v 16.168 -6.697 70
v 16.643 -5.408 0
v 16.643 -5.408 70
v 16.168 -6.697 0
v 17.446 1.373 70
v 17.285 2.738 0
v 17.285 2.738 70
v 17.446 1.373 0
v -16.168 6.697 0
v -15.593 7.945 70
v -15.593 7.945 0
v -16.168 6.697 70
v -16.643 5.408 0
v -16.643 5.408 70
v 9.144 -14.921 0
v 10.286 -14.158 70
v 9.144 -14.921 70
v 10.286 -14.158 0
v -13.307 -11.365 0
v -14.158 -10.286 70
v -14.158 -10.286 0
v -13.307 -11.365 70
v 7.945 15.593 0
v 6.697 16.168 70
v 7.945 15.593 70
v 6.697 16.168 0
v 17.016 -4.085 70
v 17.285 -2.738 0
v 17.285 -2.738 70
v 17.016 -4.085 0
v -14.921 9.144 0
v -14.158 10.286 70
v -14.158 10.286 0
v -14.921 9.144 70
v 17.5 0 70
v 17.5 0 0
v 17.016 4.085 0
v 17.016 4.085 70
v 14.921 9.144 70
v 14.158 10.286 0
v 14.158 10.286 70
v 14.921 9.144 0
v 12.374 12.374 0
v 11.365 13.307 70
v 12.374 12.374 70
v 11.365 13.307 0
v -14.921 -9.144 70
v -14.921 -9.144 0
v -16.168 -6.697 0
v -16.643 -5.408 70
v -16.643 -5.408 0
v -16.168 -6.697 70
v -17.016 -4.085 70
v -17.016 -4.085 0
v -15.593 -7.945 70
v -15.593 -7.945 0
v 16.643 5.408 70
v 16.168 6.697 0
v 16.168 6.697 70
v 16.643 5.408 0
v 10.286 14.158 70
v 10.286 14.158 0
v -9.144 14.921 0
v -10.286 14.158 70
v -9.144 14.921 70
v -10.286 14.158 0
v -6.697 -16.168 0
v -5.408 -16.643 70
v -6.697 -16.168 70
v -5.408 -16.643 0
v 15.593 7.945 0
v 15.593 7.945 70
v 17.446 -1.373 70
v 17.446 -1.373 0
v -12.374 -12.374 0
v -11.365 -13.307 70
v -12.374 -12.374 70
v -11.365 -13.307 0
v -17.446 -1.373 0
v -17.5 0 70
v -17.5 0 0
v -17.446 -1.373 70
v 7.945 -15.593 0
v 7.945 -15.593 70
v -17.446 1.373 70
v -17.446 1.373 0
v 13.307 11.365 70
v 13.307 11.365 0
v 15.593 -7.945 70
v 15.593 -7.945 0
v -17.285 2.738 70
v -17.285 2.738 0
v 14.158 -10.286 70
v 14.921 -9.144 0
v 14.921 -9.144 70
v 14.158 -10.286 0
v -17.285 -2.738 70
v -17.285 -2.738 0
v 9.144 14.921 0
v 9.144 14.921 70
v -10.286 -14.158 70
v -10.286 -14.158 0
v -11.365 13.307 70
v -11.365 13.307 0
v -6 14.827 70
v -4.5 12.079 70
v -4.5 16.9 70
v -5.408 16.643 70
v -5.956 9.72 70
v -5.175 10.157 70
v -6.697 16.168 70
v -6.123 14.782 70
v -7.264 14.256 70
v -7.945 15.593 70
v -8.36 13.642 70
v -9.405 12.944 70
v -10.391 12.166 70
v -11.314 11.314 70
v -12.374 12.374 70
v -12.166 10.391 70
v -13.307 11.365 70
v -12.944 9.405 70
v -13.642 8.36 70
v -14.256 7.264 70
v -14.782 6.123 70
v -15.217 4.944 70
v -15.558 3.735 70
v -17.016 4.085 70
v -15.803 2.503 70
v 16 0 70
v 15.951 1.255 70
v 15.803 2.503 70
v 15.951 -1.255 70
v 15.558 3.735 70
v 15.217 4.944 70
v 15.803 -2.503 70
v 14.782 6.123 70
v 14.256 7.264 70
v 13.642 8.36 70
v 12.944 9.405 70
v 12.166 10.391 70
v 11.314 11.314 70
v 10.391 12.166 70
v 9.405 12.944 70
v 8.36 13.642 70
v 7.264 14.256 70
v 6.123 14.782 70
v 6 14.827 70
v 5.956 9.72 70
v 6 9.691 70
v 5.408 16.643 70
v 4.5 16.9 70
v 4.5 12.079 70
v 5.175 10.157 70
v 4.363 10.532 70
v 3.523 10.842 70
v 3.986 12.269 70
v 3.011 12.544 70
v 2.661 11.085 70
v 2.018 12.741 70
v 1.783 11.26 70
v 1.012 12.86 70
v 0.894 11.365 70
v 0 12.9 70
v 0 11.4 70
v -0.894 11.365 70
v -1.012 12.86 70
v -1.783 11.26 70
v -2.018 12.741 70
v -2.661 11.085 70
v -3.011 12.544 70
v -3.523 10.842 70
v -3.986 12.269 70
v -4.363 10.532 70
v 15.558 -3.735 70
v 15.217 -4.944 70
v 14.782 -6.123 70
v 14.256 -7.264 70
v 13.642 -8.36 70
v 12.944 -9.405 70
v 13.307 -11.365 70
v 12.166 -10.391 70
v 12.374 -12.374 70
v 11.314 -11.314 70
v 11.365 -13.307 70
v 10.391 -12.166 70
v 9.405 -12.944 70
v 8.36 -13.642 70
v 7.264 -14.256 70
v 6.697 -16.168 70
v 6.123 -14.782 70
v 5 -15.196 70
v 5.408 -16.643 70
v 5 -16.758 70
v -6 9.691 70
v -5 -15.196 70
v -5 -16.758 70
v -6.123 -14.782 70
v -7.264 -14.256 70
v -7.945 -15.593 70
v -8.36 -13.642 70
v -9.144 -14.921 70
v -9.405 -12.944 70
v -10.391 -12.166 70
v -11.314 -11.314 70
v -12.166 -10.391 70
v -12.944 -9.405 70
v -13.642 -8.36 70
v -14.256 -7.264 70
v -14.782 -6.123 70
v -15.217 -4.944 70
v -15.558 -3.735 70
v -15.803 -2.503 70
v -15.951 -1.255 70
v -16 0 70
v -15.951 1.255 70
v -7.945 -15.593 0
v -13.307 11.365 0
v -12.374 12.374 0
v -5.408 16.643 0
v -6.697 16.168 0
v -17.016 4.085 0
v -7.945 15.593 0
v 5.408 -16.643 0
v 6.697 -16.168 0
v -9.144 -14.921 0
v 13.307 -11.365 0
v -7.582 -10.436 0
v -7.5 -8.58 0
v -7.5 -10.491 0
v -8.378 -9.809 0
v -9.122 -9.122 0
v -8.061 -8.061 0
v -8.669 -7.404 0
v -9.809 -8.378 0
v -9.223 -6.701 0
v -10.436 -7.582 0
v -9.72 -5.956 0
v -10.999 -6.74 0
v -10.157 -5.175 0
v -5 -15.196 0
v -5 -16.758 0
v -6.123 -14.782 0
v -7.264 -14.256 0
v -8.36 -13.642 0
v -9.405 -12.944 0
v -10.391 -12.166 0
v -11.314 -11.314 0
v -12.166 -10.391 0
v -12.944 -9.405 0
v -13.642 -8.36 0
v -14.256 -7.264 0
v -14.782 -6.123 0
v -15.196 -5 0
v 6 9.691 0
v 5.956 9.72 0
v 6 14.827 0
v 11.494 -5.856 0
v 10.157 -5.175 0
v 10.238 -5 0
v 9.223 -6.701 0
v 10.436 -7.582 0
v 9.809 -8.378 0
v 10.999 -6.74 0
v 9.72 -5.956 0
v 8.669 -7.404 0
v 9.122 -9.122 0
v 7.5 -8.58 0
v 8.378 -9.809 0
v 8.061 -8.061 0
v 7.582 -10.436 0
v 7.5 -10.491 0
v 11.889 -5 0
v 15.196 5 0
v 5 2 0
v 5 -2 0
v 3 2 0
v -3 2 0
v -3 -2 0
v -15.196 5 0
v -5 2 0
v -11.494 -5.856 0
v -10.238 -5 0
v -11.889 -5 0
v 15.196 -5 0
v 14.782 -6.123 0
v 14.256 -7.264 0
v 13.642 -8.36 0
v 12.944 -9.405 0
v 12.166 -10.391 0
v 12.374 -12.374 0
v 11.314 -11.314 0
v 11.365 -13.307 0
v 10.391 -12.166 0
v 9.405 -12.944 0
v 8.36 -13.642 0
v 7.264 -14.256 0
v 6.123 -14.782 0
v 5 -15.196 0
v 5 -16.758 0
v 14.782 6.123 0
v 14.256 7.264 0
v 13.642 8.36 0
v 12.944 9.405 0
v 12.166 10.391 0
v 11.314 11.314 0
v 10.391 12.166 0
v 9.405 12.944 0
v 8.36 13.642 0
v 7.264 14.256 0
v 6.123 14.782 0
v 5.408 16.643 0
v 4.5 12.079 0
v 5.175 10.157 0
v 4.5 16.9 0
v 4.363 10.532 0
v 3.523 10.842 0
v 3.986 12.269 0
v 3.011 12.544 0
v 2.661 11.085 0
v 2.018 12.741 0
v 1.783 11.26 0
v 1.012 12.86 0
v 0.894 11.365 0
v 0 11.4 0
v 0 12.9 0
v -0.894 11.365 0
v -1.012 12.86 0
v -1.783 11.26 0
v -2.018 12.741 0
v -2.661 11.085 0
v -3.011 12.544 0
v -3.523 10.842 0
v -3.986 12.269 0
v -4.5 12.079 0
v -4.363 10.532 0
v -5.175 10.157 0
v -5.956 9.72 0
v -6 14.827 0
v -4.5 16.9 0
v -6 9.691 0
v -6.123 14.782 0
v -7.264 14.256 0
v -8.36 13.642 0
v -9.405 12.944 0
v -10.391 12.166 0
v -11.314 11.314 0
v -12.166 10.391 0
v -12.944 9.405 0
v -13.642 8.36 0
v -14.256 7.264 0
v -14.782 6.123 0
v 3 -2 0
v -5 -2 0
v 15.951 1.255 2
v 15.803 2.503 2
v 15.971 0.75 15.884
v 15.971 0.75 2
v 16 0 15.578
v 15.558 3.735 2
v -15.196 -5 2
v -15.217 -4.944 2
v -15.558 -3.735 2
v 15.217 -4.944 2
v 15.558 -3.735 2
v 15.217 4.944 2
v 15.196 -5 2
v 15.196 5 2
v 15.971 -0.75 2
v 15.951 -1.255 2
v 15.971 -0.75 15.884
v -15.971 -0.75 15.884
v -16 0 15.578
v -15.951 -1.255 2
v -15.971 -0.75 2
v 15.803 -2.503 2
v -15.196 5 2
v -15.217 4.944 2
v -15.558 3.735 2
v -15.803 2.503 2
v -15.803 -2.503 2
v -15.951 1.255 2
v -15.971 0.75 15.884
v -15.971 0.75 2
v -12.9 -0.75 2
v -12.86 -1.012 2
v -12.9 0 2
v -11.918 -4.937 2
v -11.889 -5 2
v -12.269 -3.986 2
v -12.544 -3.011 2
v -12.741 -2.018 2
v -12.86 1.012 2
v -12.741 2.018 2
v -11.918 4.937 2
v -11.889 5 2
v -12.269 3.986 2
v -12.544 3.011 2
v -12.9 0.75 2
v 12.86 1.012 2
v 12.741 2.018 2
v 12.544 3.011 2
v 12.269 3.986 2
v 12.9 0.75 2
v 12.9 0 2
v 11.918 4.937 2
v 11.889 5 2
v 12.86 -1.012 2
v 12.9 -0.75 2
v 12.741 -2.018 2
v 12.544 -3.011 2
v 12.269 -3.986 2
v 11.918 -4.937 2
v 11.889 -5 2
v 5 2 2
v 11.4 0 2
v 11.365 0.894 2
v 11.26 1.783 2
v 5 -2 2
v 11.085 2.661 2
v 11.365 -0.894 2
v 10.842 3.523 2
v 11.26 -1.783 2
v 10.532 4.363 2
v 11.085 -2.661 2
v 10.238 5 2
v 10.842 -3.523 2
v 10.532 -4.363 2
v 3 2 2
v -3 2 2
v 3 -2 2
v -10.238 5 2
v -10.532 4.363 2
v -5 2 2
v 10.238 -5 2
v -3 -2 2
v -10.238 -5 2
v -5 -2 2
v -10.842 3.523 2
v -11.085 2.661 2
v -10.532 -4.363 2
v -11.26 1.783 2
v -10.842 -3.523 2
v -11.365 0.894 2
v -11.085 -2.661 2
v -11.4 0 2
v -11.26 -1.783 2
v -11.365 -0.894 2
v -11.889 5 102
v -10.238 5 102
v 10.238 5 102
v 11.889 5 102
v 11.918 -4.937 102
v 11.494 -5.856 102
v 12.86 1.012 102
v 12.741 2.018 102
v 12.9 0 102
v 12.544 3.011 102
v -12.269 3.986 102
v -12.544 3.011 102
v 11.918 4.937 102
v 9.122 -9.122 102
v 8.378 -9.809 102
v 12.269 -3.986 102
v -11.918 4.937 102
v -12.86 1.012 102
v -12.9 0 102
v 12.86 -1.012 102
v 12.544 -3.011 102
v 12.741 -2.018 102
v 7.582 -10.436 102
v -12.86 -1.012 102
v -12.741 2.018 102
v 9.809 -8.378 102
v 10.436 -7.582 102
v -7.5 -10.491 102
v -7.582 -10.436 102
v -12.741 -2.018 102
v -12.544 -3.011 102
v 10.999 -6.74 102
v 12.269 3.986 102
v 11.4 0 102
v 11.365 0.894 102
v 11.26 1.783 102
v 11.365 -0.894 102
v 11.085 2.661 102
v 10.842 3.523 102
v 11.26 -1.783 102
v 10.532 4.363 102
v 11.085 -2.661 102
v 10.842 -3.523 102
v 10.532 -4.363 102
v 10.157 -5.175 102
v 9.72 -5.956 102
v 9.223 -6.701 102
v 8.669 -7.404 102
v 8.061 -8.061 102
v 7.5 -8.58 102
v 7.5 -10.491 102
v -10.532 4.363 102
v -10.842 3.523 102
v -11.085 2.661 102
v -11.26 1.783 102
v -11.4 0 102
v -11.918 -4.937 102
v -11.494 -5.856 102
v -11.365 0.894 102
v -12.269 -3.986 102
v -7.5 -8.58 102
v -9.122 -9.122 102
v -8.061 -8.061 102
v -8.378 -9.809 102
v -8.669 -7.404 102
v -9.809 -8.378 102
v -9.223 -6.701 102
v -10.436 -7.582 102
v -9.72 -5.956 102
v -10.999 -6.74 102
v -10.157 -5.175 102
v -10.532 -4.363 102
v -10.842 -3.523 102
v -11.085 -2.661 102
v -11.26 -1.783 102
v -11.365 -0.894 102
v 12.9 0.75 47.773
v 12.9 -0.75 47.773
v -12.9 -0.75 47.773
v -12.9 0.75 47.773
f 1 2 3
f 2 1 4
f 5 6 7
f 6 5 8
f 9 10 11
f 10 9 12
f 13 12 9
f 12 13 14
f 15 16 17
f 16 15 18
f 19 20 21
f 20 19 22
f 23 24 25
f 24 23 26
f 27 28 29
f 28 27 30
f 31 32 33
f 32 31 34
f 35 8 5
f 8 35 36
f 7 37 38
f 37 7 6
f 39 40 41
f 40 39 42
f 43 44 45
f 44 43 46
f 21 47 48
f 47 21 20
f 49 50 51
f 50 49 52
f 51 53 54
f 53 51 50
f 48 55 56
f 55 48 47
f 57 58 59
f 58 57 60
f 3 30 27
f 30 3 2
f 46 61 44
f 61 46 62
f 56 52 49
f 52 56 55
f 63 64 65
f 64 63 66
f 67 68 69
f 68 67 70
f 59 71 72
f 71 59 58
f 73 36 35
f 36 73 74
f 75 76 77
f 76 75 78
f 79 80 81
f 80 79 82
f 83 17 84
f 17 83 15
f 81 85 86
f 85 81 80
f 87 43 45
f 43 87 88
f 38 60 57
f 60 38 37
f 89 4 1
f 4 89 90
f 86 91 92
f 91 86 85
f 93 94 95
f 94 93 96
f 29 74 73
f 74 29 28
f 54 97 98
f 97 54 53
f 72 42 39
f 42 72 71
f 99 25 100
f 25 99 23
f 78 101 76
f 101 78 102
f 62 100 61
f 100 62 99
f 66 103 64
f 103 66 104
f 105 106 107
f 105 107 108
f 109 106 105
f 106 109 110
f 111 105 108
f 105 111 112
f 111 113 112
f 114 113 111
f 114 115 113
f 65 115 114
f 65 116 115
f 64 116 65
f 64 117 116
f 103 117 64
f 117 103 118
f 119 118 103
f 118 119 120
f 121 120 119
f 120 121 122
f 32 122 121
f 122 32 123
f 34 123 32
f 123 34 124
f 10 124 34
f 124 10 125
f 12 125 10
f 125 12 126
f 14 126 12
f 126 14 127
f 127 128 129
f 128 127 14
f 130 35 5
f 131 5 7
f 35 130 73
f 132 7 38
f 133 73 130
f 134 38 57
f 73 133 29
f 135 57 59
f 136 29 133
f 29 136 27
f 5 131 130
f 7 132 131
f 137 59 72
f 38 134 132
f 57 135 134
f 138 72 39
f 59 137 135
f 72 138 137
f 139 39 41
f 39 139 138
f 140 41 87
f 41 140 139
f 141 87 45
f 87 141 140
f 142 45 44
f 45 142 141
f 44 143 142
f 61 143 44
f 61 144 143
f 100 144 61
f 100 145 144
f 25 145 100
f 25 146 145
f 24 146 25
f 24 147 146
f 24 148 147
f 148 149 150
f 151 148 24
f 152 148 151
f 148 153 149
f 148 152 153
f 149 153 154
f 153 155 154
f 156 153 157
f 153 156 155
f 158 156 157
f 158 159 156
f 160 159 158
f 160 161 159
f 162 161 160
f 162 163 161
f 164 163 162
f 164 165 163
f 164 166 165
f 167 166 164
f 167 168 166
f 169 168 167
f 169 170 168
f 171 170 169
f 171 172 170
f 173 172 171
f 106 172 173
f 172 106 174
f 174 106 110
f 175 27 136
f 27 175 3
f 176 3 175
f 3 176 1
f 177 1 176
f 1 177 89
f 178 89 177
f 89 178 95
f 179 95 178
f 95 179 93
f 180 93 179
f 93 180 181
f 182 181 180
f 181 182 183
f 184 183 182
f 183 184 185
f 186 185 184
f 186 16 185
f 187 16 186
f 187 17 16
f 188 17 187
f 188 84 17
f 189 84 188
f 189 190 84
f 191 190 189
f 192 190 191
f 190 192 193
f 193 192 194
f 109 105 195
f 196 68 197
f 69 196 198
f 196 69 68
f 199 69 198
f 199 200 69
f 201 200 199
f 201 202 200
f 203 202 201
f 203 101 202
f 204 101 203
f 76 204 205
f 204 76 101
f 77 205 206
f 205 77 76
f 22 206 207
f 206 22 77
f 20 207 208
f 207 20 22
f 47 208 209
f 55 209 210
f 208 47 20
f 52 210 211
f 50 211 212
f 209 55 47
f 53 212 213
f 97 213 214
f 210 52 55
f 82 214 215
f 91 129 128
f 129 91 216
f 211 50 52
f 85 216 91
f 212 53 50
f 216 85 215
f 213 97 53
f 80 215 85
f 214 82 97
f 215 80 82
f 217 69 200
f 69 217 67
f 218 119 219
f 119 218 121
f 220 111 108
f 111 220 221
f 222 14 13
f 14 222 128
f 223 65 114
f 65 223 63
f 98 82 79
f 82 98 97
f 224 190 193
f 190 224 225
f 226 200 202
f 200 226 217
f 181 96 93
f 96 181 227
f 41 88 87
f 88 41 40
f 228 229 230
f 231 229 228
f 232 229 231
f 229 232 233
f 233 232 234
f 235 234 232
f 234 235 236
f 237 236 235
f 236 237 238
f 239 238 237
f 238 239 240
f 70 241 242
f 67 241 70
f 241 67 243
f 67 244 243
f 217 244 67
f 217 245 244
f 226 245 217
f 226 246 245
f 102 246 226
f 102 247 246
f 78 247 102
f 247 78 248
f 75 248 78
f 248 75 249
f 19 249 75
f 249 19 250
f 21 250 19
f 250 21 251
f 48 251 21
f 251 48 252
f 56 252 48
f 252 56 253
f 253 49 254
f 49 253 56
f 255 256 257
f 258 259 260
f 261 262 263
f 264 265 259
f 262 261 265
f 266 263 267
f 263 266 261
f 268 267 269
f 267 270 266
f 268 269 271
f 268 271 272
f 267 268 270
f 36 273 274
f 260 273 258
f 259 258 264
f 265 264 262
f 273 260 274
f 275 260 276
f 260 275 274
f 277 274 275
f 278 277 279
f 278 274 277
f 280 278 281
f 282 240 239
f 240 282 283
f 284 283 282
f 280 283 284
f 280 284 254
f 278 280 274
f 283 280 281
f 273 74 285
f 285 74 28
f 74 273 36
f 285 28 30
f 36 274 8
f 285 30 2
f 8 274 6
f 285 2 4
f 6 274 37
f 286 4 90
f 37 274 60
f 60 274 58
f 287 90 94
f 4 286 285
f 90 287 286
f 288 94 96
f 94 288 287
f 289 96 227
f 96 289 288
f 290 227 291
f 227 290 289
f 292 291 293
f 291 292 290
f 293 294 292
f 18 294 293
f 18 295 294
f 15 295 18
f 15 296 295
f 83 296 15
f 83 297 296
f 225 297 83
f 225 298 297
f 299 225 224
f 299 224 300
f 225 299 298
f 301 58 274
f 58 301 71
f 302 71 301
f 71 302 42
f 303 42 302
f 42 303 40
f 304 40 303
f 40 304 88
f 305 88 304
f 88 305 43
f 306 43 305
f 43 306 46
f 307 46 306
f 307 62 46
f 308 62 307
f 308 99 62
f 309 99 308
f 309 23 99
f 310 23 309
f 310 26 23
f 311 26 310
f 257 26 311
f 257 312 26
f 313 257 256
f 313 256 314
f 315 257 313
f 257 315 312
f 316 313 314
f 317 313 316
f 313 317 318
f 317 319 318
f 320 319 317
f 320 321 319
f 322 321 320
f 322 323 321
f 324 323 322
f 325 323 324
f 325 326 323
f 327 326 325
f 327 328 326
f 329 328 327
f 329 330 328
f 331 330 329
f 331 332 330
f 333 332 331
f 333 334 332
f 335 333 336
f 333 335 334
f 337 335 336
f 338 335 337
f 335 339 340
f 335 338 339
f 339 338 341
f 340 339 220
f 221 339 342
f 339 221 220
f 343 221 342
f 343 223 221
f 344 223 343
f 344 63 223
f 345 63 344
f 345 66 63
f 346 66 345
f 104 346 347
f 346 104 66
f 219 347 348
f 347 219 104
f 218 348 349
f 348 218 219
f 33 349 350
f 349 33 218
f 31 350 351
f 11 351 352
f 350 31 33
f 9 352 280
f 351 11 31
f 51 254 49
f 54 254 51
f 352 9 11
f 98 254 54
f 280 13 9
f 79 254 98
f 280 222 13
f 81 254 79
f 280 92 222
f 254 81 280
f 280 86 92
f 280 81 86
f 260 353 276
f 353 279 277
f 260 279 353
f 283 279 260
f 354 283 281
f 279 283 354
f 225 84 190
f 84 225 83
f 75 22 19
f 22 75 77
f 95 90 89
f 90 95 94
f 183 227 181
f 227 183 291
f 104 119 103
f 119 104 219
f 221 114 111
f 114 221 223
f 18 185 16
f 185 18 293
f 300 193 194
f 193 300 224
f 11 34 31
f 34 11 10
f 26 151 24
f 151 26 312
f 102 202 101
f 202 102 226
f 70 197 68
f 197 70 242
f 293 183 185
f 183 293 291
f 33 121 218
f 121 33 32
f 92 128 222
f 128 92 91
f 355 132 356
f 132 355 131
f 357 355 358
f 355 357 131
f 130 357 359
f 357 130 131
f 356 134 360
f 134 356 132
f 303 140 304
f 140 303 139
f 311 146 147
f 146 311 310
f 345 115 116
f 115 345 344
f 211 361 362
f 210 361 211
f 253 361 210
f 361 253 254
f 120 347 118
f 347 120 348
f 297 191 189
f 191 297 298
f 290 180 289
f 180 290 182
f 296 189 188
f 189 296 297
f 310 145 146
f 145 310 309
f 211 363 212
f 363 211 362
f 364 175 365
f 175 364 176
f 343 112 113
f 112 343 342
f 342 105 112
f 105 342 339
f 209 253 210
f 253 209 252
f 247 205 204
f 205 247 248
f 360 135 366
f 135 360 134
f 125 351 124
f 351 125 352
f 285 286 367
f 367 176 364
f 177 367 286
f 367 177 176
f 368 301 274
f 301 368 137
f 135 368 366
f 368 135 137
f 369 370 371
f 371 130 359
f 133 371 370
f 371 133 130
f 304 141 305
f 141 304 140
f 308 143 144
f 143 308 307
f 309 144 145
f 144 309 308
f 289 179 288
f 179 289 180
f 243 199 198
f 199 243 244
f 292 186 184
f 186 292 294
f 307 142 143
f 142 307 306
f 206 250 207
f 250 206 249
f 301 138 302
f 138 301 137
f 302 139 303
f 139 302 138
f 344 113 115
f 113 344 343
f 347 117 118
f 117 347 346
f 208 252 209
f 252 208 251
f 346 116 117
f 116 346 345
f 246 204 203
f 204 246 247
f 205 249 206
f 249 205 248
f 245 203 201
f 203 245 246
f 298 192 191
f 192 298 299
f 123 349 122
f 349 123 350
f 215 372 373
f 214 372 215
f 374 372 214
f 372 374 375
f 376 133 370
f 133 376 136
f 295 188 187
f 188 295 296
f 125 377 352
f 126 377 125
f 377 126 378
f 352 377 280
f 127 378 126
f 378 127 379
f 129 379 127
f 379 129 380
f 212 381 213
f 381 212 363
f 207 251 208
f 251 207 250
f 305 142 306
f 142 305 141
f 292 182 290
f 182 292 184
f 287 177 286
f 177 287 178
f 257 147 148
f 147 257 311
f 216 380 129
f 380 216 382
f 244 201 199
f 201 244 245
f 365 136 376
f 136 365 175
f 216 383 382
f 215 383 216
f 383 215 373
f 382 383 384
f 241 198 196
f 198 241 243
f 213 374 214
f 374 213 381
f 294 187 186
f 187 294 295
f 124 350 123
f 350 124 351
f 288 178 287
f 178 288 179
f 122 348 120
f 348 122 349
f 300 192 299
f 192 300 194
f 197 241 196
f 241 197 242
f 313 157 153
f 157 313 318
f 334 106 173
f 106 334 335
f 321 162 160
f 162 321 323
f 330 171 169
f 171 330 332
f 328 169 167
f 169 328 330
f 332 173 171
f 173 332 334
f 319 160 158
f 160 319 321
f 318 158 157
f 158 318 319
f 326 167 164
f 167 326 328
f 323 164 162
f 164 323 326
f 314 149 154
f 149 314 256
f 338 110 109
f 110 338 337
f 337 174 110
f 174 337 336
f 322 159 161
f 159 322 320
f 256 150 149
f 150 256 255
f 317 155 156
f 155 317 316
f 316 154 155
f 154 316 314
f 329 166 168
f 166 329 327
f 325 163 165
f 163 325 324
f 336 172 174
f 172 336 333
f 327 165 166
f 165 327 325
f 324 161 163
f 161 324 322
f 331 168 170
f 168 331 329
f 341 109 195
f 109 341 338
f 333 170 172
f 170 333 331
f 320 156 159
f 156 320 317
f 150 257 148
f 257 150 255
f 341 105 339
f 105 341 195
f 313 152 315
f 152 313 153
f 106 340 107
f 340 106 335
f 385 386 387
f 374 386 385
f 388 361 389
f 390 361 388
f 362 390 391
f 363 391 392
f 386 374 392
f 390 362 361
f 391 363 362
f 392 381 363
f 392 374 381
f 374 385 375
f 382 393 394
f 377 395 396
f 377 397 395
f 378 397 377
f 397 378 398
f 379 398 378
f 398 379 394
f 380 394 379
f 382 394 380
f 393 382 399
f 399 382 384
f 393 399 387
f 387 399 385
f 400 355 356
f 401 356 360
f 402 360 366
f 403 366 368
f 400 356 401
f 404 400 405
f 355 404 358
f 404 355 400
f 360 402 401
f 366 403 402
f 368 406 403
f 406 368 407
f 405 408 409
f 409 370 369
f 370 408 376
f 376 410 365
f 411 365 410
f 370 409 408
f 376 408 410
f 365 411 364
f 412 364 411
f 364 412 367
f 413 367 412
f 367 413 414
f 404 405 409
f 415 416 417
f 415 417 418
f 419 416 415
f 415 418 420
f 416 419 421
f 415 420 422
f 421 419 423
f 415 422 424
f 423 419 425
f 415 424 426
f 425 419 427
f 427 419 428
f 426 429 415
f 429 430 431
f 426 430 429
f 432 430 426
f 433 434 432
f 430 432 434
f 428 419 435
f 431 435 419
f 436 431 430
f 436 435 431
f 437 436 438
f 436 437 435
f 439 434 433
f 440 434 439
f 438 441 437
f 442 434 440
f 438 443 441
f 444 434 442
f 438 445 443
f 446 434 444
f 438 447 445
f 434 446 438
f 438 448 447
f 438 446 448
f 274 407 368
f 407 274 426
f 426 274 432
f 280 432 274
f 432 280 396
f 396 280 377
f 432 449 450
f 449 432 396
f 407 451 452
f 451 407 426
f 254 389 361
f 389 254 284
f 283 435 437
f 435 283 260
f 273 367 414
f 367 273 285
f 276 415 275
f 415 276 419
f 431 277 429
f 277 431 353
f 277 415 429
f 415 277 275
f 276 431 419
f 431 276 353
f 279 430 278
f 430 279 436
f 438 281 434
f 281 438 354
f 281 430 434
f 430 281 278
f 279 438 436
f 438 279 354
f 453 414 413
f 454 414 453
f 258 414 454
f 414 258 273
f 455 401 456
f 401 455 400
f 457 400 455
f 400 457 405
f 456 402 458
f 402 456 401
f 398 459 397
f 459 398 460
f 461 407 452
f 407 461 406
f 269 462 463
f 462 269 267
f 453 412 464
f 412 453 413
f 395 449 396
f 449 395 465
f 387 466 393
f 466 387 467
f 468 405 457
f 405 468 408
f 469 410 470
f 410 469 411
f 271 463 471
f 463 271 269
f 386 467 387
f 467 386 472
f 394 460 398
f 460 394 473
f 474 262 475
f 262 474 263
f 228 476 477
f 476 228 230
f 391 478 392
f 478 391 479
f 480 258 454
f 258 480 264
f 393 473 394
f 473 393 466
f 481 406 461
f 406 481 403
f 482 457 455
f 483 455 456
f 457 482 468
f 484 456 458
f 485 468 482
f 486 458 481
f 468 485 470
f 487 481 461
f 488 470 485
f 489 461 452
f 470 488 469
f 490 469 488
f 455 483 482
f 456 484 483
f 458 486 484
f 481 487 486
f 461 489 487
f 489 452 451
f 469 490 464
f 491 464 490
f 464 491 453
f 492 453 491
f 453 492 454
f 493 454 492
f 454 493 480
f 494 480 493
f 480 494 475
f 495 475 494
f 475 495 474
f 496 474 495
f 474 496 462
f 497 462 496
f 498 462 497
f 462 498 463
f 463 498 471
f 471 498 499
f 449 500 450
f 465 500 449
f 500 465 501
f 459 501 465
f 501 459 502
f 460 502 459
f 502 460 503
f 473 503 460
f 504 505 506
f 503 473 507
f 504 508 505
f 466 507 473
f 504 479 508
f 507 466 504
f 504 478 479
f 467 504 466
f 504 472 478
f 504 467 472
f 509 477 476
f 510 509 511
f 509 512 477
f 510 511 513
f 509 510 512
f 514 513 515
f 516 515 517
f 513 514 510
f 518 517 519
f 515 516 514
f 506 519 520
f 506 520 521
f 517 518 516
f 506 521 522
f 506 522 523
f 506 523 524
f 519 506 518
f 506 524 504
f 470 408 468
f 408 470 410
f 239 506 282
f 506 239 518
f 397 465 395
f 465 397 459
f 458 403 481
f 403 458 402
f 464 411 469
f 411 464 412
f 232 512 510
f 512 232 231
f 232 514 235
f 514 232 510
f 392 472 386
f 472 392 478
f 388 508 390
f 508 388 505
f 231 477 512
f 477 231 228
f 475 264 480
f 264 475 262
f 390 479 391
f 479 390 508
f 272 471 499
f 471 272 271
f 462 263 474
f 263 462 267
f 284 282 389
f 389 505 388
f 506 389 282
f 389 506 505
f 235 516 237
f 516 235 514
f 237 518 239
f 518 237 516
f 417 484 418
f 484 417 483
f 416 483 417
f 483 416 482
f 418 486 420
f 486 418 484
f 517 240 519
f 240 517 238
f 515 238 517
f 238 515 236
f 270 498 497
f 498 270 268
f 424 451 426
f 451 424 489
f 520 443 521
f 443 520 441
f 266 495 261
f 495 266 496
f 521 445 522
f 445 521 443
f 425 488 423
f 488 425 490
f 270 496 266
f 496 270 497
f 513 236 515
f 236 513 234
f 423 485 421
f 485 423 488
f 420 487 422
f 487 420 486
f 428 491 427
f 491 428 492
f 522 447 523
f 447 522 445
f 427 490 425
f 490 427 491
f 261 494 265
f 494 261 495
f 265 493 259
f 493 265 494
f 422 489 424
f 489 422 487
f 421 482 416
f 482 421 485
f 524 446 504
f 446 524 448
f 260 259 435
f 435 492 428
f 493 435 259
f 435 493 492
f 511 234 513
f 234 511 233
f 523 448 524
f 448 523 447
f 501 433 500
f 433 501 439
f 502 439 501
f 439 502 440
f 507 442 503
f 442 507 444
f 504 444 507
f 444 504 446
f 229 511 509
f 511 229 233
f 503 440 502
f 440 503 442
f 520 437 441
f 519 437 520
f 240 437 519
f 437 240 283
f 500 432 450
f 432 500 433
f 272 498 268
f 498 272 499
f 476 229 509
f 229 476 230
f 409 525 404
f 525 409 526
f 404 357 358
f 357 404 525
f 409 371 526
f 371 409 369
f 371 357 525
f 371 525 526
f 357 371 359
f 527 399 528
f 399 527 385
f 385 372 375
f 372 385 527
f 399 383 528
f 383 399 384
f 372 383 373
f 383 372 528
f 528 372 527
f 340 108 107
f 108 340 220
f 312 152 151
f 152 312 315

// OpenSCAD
// file: variables.scad
// General

resolution = 80;
delta = 0.2;

// dimensions tubes pvc

rayon_ext_tube_32 = 16;
rayon_int_tube_32 = 13;
epaisseur_tube_32 = rayon_ext_tube_32 - rayon_int_tube_32;

rayon_ext_tube_40 = 20;
rayon_int_tube_40 = 17.5;
epaisseur_tube_40 = rayon_ext_tube_40 - rayon_int_tube_40;

ret32 = rayon_ext_tube_32;
rit32 = rayon_int_tube_32;
ep32  = epaisseur_tube_32;
ret40 = rayon_ext_tube_40;
rit40 = rayon_int_tube_40;
ep40  = epaisseur_tube_40;

// L'embout accueille un tube pvc de 40mm de diamètre.

hauteur_embout = 20;
rayon_int_embout = rayon_ext_tube_40 + delta;
rayon_ext_embout = 24 + delta;

hauteur_butee = 2;
rayon_int_butee = 16;

// Jonction: section de contact entre les deux pièces.

//hauteur du ressort comprimé
hauteur_ressort = 7.5;

rayon_ext_culot = rayon_ext_tube_40 - delta;
rayon_int_culot = 18 - delta;

rayon_ext_spot = 26;

hauteur_jonction = 30;

hauteur_totale = hauteur_jonction + hauteur_embout + hauteur_butee + hauteur_ressort;

profondeur_douille = 12;

largeur_empreinte = 6;

nb_baionette = 3;
rayon_baionette = (largeur_empreinte / 2)*0.95;
// file: common.scad
module tube(hauteur, rayon_exterieur, rayon_interieur, resolution=resolution) {
	difference(){
	  cylinder(hauteur, rayon_exterieur, rayon_exterieur, $fn=resolution);
	  translate([0,0,-1])
	 	  cylinder(hauteur + 2 , rayon_interieur, rayon_interieur, $fn=resolution);
	}
}

module donut(rayon_spheres, rayon_exterieur){
	rotate_extrude(convexity = 10, $fn = resolution)
		translate([rayon_exterieur,0,0])
		circle(r = rayon_spheres, $fn = resolution);
}

module languette() {
  translate([5,0,0])
    cylinder(4,4,4, $fn=resolution);
  translate([-2,-4,0])
    cube([6,8,4]);
}
// main file
include <common.scad>;
include <variables.scad>;

epaisseur = 1.5;
h_gaine = 70;
r_gaine = rit40;
r_rigole = 5;

r_piles = 11 + delta*2;
h_support = 32;

difference(){
  union() {
    gaine();
    rigole();
    fond_contact(r_gaine*2);
    support_piles();
    renforts();
  }
  translate([0,0,-1])
    tube(h_gaine+2, r_gaine+10, r_gaine);
}

module gaine() {
  difference(){
    tube(h_gaine, r_gaine, r_gaine-epaisseur, resolution);
    translate([-r_rigole,-(r_gaine+1),-1])
      cube([r_rigole*2,r_rigole*2,h_gaine+2]);

    translate([-r_rigole,r_gaine-3,-1])
      cube([r_rigole*2,r_rigole*2,h_gaine+2]);
  }
}

module rigole() {
  l_rigole = 12;
  h_rigole = r_gaine-r_piles;

  intersection(){
    tube(h_gaine, r_piles+epaisseur, r_piles);
    translate([-l_rigole/2,h_rigole+epaisseur,-1])
      cube([l_rigole,h_rigole,h_gaine+2]);
  }
  translate([(l_rigole/2)-epaisseur,r_piles,0])
    cube([epaisseur,h_rigole,h_gaine]);
  translate([-(l_rigole/2),r_piles,0])
    cube([epaisseur,h_rigole,h_gaine]);
}

module fond_contact(largeur, epaisseur=2) {
  difference(){
    translate([-(largeur/2)+1,-5,0])
      cube([largeur-2,10,epaisseur]);
    translate([3,-2,-1])
      cube([2,4,epaisseur+2]);
    translate([-5,-2,-1])
      cube([2,4,epaisseur+2]);
  }
}

module support_piles() {
  hsp = h_gaine + h_support;
  decoupe1 = 25;
  decoupe2 = 15;

  difference(){
    tube(hsp, r_piles+epaisseur, r_piles);
    translate([-decoupe1/2,5,-1])
      cube([decoupe1,decoupe1,hsp+2]);
    translate([-decoupe2/2,-(r_piles+5),-1])
      cube([decoupe2,decoupe2,hsp+2]);
  }
}

module renforts() {
  base_renfort = r_gaine - (r_piles+epaisseur);

  translate([r_piles+epaisseur,-epaisseur/2,0])
    difference() {
      cube([base_renfort,epaisseur,50]);
      translate([base_renfort,-1,0])
        rotate([0,-5.5,0]) {
          cube([base_renfort,epaisseur+2,52]);
        }
    }

  rotate([0,0,180]) {
    translate([r_piles+epaisseur,-epaisseur/2,0])
      difference() {
        cube([base_renfort,epaisseur,50]);
        translate([base_renfort,-1,0])
          rotate([0,-5.5,0]) {
            cube([base_renfort,epaisseur+2,52]);
          }
      }
  }
}
